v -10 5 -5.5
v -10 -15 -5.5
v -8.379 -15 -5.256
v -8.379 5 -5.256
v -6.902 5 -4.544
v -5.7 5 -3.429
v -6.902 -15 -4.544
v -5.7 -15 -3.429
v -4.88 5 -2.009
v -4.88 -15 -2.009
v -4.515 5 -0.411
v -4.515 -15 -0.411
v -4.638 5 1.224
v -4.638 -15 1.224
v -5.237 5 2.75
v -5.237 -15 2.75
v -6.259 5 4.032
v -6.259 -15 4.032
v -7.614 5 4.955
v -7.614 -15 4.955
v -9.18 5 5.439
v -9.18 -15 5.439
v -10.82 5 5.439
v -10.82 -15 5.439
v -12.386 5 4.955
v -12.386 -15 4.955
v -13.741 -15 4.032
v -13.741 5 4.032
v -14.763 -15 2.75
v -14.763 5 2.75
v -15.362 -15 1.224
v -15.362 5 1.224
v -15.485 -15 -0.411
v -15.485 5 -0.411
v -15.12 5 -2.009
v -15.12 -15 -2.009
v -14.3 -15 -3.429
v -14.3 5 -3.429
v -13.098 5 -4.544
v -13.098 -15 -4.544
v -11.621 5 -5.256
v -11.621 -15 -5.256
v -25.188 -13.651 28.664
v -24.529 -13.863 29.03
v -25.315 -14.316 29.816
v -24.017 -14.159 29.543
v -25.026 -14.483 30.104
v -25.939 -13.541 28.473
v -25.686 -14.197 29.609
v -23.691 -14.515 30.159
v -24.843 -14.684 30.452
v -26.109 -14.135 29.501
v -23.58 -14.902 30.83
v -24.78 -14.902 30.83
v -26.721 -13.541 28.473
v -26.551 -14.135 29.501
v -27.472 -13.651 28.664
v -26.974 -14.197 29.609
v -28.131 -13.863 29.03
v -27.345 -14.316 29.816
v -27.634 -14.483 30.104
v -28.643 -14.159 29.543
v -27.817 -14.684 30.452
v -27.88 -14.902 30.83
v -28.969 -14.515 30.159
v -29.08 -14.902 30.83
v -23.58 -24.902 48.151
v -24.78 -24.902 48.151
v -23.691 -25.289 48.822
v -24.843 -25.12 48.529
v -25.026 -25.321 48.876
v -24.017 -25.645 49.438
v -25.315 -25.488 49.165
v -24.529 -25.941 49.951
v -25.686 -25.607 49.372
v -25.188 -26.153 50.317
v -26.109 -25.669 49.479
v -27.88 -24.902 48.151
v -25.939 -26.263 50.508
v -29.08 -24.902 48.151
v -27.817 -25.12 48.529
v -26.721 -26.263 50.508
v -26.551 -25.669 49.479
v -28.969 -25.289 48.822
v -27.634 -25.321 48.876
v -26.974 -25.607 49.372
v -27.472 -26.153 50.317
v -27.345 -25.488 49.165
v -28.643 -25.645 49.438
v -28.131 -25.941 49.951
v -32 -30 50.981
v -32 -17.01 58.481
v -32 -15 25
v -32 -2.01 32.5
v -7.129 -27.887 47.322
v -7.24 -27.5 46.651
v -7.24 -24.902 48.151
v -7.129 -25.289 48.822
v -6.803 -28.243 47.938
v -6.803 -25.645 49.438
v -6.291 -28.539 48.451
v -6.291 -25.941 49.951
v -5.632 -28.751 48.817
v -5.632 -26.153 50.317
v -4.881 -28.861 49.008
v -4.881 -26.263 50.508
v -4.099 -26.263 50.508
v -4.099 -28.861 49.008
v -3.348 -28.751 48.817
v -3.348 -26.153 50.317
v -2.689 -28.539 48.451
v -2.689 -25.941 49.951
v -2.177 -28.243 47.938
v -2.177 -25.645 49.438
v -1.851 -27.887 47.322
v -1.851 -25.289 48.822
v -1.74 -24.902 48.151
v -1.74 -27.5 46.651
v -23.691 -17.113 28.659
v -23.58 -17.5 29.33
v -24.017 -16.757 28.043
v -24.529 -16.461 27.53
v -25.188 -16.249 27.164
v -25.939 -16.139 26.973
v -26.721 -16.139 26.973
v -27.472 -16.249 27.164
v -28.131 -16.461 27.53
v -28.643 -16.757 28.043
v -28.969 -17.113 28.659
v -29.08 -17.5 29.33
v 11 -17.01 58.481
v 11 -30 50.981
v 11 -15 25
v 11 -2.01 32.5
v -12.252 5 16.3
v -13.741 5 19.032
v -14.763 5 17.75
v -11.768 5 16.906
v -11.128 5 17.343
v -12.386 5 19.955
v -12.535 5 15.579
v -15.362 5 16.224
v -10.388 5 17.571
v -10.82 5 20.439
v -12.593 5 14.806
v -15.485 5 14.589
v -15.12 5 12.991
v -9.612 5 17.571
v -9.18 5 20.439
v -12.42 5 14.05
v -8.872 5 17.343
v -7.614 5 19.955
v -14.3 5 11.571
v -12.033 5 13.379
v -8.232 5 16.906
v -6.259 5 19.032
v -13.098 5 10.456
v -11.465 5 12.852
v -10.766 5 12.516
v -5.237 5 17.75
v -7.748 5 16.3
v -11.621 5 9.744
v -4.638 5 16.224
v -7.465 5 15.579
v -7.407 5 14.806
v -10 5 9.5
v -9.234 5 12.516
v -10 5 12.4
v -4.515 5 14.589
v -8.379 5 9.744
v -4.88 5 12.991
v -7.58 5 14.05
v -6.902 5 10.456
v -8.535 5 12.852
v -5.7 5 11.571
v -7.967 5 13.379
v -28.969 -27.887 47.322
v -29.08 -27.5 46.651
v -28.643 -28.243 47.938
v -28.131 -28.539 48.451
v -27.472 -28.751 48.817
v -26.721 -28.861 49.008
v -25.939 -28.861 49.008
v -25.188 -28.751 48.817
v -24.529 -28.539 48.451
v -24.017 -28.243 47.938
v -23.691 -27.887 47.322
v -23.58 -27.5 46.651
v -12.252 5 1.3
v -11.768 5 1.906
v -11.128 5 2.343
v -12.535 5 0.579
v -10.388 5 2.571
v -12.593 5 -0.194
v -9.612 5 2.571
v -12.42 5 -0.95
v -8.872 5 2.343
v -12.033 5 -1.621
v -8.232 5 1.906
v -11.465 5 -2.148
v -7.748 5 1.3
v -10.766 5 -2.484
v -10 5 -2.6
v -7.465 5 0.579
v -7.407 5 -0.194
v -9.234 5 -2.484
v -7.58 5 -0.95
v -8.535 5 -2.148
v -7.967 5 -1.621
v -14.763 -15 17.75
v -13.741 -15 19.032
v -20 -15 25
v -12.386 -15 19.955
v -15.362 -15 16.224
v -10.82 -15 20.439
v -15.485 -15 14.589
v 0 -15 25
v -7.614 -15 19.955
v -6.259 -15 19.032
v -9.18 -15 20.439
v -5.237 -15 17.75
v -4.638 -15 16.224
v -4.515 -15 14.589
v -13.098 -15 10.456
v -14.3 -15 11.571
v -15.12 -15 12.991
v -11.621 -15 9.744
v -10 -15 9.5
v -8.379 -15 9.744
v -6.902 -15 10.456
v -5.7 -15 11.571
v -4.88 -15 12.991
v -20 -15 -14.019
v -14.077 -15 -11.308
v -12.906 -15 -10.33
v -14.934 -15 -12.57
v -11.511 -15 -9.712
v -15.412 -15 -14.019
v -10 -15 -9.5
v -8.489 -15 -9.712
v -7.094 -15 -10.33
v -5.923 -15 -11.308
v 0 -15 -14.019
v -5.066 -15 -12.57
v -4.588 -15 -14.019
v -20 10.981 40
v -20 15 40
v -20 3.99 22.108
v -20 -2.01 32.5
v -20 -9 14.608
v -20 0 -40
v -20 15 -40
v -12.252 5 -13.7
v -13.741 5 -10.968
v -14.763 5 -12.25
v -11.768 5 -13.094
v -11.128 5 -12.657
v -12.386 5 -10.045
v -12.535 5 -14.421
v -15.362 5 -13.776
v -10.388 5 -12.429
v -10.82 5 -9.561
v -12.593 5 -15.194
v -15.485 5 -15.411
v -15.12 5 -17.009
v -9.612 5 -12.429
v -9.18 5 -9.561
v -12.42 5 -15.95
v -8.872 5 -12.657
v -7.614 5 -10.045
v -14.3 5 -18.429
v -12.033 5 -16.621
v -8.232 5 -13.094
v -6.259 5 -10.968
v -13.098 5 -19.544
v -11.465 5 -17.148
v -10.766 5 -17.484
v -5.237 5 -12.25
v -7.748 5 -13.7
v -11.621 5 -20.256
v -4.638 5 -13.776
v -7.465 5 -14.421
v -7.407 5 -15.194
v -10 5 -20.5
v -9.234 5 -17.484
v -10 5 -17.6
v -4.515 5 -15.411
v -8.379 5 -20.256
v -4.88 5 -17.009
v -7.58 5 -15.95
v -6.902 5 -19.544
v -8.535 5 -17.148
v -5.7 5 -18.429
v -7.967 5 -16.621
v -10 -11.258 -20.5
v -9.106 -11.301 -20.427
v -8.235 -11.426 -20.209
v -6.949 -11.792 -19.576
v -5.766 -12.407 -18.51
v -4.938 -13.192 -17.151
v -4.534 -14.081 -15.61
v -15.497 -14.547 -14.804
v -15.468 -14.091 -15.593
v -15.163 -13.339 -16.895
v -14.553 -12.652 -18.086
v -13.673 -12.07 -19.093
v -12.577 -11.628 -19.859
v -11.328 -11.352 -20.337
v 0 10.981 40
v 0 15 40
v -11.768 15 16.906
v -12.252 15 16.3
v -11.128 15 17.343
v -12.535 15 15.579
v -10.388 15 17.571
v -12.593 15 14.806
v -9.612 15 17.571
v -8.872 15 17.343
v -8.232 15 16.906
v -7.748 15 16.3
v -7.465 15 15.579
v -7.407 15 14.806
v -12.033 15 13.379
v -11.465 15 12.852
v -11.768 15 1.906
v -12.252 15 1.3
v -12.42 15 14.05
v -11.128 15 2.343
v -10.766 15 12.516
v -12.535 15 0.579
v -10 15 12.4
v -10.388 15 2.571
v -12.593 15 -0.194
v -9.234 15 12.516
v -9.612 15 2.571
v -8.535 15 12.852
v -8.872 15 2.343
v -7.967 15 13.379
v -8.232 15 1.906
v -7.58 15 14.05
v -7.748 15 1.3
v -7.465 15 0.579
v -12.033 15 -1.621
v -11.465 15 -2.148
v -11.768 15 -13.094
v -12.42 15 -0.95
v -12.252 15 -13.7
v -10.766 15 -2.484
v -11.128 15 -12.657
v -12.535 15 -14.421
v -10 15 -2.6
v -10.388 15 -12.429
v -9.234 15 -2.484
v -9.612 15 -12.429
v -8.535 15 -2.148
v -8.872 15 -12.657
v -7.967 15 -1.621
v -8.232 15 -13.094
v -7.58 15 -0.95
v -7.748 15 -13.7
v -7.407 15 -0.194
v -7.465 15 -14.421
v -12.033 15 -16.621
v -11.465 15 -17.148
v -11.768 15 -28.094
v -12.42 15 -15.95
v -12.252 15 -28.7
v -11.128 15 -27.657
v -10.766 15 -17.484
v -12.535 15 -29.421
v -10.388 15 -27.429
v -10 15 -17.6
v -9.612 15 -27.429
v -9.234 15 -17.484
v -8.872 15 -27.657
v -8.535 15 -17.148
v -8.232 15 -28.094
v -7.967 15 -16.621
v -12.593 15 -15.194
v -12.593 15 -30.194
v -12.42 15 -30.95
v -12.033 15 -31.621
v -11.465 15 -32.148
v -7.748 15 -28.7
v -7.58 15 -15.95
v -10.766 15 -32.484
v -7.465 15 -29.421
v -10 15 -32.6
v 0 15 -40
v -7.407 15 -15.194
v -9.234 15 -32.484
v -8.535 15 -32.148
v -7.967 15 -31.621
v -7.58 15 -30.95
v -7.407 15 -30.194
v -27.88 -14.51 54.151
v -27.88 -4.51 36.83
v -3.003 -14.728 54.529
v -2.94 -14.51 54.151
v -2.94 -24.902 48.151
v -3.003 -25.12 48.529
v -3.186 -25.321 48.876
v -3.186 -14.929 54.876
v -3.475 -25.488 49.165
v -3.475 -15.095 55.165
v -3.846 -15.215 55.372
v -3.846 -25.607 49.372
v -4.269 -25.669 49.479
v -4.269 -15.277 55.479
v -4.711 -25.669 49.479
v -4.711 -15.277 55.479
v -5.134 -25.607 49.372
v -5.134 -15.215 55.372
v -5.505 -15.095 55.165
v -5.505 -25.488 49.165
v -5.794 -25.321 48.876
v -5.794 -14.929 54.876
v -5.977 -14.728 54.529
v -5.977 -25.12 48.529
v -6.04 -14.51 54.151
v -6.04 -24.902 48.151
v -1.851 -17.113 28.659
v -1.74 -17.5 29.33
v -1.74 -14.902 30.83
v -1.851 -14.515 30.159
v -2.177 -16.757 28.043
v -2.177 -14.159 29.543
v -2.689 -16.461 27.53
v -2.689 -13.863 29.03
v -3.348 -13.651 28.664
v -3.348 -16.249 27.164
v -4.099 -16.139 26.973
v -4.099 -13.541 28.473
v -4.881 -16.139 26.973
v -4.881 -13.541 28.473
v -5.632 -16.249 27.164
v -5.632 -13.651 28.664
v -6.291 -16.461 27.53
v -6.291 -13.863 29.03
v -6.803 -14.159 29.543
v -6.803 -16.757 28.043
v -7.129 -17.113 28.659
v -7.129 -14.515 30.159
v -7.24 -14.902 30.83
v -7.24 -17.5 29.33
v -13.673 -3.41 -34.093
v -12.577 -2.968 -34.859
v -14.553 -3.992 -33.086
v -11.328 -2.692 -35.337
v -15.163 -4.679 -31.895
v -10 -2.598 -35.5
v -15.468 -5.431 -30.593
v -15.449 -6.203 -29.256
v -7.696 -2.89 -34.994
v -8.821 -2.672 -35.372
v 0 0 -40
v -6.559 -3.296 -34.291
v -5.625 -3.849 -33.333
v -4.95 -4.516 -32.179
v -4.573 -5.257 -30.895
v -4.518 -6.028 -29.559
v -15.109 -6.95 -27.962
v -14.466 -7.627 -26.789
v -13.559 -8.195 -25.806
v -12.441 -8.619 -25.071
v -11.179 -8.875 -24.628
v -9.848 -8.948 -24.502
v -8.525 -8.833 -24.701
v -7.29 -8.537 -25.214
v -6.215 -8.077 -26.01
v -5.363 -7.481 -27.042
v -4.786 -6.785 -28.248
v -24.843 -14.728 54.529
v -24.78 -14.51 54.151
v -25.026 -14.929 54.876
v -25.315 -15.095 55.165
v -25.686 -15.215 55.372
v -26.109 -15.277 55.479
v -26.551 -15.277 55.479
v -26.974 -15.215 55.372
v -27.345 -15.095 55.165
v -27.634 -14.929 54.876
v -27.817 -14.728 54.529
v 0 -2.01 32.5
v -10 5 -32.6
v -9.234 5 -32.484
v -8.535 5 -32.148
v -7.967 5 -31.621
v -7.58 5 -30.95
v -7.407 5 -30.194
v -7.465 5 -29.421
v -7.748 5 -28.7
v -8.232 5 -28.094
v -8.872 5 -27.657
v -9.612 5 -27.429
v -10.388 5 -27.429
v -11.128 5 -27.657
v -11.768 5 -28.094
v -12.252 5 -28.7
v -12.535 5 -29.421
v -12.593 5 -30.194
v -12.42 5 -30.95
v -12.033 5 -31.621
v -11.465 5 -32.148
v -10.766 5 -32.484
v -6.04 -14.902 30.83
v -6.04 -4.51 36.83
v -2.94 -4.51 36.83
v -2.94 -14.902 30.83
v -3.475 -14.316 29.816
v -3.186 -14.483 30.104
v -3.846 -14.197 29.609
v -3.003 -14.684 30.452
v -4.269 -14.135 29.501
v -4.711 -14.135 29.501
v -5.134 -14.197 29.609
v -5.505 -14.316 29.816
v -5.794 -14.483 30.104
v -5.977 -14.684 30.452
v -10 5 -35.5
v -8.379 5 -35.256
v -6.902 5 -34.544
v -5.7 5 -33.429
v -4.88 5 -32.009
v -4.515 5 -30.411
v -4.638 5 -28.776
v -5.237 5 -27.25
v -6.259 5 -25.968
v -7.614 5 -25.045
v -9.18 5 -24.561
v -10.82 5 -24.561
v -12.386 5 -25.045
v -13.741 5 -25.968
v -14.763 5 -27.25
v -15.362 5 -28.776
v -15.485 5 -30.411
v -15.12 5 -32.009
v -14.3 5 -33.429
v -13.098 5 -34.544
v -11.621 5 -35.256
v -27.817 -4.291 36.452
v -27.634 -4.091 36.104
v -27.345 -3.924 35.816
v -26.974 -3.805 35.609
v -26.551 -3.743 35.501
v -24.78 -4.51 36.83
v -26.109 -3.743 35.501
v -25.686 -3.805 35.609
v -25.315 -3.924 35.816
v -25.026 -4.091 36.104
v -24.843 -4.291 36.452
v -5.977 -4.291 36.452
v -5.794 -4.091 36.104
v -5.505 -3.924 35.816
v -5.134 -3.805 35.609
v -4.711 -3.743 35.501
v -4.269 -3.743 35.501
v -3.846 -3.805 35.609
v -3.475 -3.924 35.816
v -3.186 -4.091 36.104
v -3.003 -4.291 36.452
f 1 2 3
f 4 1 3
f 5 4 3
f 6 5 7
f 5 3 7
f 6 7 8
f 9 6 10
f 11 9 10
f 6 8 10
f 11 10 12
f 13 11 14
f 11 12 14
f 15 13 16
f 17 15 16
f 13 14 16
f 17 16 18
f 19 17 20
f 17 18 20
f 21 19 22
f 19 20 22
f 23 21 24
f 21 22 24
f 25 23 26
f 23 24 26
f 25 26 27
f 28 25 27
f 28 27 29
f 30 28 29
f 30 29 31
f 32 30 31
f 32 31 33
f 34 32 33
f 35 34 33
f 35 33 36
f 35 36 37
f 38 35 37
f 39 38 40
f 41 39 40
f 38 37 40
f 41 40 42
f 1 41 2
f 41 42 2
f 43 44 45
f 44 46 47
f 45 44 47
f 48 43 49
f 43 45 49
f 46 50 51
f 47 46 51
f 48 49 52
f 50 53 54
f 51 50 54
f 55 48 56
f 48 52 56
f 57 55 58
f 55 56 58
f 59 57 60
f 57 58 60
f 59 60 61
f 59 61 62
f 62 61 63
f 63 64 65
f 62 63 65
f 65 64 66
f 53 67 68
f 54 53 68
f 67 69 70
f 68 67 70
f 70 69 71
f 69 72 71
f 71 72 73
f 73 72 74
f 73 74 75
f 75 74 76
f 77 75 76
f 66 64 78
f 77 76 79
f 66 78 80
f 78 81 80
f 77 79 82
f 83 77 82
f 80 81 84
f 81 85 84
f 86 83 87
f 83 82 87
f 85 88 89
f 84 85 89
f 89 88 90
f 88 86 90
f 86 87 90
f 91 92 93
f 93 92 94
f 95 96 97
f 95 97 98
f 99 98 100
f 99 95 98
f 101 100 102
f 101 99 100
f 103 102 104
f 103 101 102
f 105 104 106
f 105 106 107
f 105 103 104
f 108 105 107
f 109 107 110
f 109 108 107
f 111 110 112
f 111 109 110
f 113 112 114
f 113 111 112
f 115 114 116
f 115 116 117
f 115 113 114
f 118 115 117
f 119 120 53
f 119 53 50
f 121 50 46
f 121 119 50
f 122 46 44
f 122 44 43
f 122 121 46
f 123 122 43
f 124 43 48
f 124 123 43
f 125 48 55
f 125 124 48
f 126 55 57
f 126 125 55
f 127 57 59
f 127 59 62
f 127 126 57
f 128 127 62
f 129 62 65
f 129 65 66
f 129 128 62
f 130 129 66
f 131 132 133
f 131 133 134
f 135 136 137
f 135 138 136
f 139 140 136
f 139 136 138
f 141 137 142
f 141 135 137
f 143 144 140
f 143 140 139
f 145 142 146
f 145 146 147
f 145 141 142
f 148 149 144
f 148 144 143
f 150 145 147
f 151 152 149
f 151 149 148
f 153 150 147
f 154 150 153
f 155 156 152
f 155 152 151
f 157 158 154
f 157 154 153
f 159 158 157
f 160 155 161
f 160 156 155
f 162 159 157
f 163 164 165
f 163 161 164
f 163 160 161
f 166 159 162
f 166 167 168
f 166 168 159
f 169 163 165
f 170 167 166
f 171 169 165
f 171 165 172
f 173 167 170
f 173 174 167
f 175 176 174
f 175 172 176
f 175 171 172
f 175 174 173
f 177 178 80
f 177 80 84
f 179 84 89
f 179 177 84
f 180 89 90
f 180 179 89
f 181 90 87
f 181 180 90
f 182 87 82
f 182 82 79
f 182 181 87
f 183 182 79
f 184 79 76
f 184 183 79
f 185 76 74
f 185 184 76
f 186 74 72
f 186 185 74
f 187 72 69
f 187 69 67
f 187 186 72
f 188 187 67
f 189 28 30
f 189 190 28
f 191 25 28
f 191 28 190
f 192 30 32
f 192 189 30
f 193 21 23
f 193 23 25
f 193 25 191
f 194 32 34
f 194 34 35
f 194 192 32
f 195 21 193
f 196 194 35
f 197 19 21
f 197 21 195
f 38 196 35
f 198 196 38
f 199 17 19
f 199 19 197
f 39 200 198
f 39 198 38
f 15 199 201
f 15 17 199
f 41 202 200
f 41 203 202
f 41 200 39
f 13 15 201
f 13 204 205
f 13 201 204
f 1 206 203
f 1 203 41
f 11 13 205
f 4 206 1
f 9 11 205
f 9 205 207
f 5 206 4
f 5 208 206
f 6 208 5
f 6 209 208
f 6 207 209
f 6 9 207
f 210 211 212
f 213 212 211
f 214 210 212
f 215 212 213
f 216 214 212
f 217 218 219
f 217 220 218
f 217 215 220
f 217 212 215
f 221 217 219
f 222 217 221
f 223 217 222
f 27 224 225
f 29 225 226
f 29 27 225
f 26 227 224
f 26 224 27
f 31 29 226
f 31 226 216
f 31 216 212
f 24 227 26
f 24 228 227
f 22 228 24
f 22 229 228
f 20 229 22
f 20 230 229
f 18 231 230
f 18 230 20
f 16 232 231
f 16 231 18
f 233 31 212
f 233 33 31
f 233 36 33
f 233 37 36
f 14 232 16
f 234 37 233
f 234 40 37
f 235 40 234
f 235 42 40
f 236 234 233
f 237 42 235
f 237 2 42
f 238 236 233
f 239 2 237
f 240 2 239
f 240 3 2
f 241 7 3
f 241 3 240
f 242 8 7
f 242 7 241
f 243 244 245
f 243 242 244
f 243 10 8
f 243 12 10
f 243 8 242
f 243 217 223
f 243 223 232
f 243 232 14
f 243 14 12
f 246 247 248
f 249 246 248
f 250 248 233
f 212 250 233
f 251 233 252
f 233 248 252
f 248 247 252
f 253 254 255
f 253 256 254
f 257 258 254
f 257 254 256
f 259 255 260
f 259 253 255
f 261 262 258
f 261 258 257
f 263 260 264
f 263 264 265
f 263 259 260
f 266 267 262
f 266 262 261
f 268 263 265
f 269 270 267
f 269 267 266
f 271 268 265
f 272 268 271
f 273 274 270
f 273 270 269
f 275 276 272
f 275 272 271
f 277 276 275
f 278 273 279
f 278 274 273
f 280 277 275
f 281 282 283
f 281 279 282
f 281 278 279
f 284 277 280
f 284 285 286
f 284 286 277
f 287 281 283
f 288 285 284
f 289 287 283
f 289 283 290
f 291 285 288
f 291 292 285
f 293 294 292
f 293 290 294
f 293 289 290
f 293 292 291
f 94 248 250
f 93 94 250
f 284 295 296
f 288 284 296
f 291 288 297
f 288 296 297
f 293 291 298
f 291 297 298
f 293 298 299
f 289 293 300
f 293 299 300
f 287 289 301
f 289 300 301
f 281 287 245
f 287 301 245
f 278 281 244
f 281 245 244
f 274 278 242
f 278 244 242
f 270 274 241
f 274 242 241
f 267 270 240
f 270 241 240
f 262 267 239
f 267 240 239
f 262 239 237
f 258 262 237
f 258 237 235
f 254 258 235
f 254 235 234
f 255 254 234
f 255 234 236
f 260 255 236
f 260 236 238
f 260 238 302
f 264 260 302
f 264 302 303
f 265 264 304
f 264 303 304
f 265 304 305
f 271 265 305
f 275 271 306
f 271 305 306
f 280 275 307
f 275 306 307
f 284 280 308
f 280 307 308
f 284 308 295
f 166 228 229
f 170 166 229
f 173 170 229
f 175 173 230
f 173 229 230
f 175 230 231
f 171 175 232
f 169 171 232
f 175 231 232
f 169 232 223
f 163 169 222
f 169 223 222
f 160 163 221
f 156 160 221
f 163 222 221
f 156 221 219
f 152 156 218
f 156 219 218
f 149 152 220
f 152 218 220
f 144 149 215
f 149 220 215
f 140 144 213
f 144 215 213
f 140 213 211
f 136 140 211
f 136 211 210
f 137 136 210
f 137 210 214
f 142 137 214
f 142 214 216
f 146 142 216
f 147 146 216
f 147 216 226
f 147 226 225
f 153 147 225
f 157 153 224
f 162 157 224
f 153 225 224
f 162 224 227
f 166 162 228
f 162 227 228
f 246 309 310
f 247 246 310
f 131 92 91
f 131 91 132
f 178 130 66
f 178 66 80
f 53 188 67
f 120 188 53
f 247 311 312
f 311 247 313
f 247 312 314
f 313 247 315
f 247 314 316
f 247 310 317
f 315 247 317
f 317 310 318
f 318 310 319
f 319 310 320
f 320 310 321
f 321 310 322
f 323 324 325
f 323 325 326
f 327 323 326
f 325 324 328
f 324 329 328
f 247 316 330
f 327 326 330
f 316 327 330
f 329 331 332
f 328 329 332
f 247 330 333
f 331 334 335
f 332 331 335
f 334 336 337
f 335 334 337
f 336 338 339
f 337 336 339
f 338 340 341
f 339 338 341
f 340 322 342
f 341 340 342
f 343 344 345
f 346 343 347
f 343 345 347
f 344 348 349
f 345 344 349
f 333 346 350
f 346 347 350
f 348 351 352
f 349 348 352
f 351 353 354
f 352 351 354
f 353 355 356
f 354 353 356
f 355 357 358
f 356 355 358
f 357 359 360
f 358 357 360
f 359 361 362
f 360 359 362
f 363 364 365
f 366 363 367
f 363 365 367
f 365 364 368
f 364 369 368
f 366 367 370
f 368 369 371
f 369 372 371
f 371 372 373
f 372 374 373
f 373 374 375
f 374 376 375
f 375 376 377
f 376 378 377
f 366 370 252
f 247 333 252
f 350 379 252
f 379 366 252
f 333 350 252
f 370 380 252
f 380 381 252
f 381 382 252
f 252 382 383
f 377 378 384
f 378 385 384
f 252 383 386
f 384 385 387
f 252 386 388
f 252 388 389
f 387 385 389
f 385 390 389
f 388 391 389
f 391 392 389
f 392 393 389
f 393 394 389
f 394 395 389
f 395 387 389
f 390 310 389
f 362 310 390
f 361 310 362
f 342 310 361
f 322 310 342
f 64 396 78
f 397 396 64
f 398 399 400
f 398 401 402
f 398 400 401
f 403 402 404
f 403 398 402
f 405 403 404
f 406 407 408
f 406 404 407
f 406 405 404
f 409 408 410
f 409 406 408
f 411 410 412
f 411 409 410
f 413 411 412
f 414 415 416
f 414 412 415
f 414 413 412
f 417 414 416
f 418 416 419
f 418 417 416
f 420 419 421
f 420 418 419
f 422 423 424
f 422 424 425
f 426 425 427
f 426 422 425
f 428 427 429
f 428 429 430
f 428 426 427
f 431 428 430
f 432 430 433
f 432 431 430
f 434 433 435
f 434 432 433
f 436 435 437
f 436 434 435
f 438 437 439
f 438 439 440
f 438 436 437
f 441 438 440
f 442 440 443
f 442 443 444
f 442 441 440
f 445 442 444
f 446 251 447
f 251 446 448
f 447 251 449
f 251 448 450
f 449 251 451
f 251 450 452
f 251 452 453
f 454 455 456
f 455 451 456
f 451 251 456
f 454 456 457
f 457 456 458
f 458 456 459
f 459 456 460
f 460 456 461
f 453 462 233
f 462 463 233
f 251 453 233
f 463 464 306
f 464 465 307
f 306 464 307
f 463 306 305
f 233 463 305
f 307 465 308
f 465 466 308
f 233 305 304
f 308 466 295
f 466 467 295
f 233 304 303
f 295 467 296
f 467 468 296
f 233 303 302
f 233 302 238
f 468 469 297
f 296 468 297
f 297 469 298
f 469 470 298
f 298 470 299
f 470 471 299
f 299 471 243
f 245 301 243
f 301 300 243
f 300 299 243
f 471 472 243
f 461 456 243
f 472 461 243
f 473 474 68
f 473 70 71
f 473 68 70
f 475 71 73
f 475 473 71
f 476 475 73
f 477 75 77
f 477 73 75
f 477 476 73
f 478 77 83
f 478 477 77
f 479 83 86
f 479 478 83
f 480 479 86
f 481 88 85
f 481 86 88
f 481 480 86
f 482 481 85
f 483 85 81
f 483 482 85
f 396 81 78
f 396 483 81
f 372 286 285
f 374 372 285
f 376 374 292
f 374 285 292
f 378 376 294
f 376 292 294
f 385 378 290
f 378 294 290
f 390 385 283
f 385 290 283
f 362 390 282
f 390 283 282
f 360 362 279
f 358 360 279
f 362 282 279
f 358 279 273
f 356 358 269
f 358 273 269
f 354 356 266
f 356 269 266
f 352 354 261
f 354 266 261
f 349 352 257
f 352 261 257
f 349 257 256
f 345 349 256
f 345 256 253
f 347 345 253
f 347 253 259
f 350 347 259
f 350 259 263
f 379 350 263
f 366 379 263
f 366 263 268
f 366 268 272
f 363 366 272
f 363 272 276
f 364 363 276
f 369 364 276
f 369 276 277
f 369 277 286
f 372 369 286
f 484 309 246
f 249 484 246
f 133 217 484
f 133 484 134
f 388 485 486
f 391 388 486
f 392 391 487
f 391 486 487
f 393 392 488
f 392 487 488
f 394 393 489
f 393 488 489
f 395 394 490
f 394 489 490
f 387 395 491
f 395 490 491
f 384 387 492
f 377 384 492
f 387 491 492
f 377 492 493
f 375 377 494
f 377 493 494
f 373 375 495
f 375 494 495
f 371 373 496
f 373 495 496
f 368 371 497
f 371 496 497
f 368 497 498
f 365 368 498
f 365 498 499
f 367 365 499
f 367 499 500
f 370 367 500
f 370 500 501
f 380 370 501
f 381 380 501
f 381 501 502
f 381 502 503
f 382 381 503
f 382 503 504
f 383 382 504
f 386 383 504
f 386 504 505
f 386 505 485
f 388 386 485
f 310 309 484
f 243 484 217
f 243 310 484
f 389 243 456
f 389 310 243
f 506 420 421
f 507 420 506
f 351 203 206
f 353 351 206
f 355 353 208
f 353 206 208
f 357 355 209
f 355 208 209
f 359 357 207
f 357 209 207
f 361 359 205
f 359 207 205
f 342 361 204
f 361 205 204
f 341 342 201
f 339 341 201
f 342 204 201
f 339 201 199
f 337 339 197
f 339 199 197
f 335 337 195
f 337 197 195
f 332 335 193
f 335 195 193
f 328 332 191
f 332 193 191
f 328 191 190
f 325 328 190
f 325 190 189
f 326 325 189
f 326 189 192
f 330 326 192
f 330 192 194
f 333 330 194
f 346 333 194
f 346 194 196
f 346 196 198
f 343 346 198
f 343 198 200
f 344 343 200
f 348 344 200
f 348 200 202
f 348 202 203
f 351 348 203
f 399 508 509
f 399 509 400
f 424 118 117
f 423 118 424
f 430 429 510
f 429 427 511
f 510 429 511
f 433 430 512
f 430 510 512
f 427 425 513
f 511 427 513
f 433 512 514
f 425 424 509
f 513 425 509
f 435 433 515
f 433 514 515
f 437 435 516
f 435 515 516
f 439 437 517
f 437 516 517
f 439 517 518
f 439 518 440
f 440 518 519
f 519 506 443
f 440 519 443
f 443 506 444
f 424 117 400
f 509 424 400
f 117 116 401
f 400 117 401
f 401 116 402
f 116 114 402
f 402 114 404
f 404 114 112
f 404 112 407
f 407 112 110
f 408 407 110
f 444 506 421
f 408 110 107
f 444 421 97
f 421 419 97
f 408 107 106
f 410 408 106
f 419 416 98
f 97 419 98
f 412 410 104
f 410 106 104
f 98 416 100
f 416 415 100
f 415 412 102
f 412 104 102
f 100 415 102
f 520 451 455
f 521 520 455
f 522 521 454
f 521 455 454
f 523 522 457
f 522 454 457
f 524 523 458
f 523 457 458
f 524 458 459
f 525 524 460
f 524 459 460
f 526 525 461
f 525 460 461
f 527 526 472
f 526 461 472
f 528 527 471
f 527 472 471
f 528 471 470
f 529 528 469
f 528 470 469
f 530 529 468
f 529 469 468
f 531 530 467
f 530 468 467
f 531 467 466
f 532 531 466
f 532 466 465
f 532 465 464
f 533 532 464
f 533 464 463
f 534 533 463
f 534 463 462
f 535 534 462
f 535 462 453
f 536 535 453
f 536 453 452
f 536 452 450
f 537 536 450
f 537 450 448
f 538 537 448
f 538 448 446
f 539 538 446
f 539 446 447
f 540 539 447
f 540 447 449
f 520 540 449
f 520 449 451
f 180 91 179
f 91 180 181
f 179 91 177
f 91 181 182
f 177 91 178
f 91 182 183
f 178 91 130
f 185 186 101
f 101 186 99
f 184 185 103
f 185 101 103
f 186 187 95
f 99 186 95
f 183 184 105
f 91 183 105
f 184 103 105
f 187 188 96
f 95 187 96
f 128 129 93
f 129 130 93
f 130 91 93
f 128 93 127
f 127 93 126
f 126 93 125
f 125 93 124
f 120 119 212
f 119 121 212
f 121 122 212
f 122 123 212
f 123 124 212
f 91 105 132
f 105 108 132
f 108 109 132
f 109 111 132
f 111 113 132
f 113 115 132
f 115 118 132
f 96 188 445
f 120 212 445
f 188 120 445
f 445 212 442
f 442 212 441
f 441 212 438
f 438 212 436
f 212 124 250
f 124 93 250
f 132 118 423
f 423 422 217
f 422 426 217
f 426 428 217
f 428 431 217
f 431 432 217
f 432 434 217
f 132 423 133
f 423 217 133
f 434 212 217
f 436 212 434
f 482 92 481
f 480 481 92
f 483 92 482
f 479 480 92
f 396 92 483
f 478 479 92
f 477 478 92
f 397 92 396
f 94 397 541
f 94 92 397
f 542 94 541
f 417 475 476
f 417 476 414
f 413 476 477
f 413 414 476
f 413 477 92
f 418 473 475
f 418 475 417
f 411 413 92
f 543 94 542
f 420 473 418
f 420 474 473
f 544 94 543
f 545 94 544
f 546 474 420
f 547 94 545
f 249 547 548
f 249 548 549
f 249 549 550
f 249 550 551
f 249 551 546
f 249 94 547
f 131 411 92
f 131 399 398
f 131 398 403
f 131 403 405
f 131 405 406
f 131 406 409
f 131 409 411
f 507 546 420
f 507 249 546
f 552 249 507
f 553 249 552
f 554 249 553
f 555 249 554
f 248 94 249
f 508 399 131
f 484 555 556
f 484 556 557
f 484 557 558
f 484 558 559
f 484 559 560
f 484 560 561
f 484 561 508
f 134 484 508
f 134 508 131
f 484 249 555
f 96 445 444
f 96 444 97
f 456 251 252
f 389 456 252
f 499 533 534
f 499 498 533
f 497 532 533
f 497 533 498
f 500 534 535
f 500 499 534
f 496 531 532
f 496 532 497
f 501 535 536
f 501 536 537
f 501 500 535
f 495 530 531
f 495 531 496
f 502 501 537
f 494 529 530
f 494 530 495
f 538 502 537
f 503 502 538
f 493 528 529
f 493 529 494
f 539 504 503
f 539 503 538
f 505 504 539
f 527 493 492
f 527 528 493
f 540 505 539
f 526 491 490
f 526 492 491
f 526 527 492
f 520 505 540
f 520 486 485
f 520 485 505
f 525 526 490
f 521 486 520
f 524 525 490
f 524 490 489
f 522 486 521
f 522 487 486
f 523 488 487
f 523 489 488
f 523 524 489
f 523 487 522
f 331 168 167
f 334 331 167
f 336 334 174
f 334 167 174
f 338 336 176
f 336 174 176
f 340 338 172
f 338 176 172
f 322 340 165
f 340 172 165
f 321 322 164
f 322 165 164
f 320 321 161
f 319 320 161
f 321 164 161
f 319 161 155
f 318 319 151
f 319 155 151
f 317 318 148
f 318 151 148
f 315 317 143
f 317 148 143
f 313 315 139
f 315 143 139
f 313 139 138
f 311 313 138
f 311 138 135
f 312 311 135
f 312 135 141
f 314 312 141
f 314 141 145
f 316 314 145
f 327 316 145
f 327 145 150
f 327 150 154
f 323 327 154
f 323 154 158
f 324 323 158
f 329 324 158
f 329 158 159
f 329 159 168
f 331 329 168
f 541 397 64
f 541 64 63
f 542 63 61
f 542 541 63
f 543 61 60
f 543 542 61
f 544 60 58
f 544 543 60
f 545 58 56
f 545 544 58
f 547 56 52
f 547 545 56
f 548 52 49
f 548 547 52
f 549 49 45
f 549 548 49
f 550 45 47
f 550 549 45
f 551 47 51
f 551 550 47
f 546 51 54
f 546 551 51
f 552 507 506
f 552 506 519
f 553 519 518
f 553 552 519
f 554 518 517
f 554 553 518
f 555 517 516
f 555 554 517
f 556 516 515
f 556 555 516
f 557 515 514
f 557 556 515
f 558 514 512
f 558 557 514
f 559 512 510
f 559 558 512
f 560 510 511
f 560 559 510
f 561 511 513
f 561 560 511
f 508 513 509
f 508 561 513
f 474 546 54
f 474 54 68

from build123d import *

# Parameters (mm, degrees)
SKETCH1_W           = 80
SKETCH1_H           = 30
BOSS_EXTRUDE1_DEPTH = 20
CHAMFER1_SIZE       = 15
CHAMFER1_SIZE2      = 25.980762114
SKETCH2_W           = 43
SKETCH2_H           = 15
BOSS_EXTRUDE2_DEPTH = 30
CUT_EXTRUDE1_REACH  = 75.891
CUT_EXTRUDE2_DEPTH  = 3
SKETCH5_W           = 12
SKETCH5_H           = 12
BOSS_EXTRUDE3_DEPTH = 15
CHAMFER2_SIZE       = 12
CUT_EXTRUDE3_REACH  = 75.103
SKETCH6_R           = 2.6
SKETCH7_R           = 5.5
CUT_EXTRUDE4_DEPTH  = 20
CHAMFER3_SIZE       = 15
CHAMFER3_SIZE_2     = 25.980762114


# Some blends are built 0.0001 mm under size
with BuildPart() as part:
    # Sketch1 → Boss-Extrude1 (new body)
    with BuildSketch(Plane(origin=(0, 0, 0), x_dir=(0, 0, -1), z_dir=(1, 0, 0))):
        Rectangle(SKETCH1_W, SKETCH1_H)
    extrude(amount=-BOSS_EXTRUDE1_DEPTH)

    # Chamfer1
    chamfer1_edges = [part.edges().sort_by_distance(p)[0] for p in [
        (-10, -15, 40),
    ]]
    chamfer1_side = [part.faces().sort_by_distance(p)[0] for p in [
        (-10, -15, 0),
    ]]
    chamfer(chamfer1_edges, length=CHAMFER1_SIZE, length2=CHAMFER1_SIZE2, reference=chamfer1_side[0])

    # Sketch2 → Boss-Extrude2 (add)
    with BuildSketch(Plane(origin=(0, -14.575317547, 25.245190528), x_dir=(1, 0, 0), z_dir=(0, -0.5000000000000012, 0.866025403784438))):
        with Locations((-10.5, 7.009618943)):
            Rectangle(SKETCH2_W, SKETCH2_H)
    extrude(amount=BOSS_EXTRUDE2_DEPTH)

    # Sketch3 → Cut-Extrude1 (cut, up to next)
    with BuildSketch(Plane(origin=(0, 12.565698604, 7.254809472), x_dir=(1, 0, 0), z_dir=(0, 0.8660254037844378, 0.5000000000000013)), mode=Mode.PRIVATE) as cut_extrude1_sk1:
        with BuildLine():
            Line((-24.78, -34.150635095), (-24.78, -54.150635095))
            ThreePointArc((-24.78, -54.150635095), (-26.33, -55.700635095), (-27.88, -54.150635095))
            Line((-27.88, -54.150635095), (-27.88, -34.150635095))
            ThreePointArc((-27.88, -34.150635095), (-26.33, -32.600635095), (-24.78, -34.150635095))
        make_face()
    cut_extrude1_tool1 = extrude(cut_extrude1_sk1.sketch, amount=-CUT_EXTRUDE1_REACH, mode=Mode.PRIVATE) & part.part
    # Sketch3 → Cut-Extrude1 (cut, up to next)
    with BuildSketch(Plane(origin=(0, 12.565698604, 7.254809472), x_dir=(1, 0, 0), z_dir=(0, 0.8660254037844378, 0.5000000000000013)), mode=Mode.PRIVATE) as cut_extrude1_sk2:
        with BuildLine():
            Line((-2.94, -34.150635095), (-2.94, -54.150635095))
            ThreePointArc((-2.94, -54.150635095), (-4.49, -55.700635095), (-6.04, -54.150635095))
            Line((-6.04, -54.150635095), (-6.04, -34.150635095))
            ThreePointArc((-6.04, -34.150635095), (-4.49, -32.600635095), (-2.94, -34.150635095))
        make_face()
    cut_extrude1_tool2 = extrude(cut_extrude1_sk2.sketch, amount=-CUT_EXTRUDE1_REACH, mode=Mode.PRIVATE) & part.part
    add(cut_extrude1_tool1.solids().sort_by_distance((-26.33, -9.509619, 45.490381))[0], mode=Mode.SUBTRACT)
    add(cut_extrude1_tool2.solids().sort_by_distance((-4.49, -9.509619, 45.490381))[0], mode=Mode.SUBTRACT)

    # Sketch4 → Cut-Extrude2 (cut)
    with BuildSketch(Plane(origin=(0, -0.424682453, -0.245190528), x_dir=(1, 0, 0), z_dir=(0, -0.8660254037844379, -0.5000000000000013))):
        with BuildLine():
            Line((-23.58, 54.150635095), (-23.58, 34.150635095))
            ThreePointArc((-23.58, 34.150635095), (-26.33, 31.400635095), (-29.08, 34.150635095))
            Line((-29.08, 34.150635095), (-29.08, 54.150635095))
            ThreePointArc((-29.08, 54.150635095), (-26.33, 56.900635095), (-23.58, 54.150635095))
        make_face()
        with BuildLine():
            Line((-1.74, 54.150635095), (-1.74, 34.150635095))
            ThreePointArc((-1.74, 34.150635095), (-4.49, 31.400635095), (-7.24, 34.150635095))
            Line((-7.24, 34.150635095), (-7.24, 54.150635095))
            ThreePointArc((-7.24, 54.150635095), (-4.49, 56.900635095), (-1.74, 54.150635095))
        make_face()
    extrude(amount=-CUT_EXTRUDE2_DEPTH, mode=Mode.SUBTRACT)

    # Sketch5 → Boss-Extrude3 (add)
    with BuildSketch(Plane(origin=(0, 12.565698604, 7.254809472), x_dir=(1, 0, 0), z_dir=(0, 0.8660254037844378, 0.5000000000000013))):
        with Locations((-26, -23.150635095)):
            Rectangle(SKETCH5_W, SKETCH5_H)
    extrude(amount=-BOSS_EXTRUDE3_DEPTH)

    # Chamfer2
    chamfer2_edges = [part.edges().sort_by_distance(p)[0] for p in [
        (-32, -2.504809472, 18.357695155),
    ]]
    chamfer(chamfer2_edges, length=CHAMFER2_SIZE - 0.0001)  # a hair under: the kernel refuses the full size

    # Sketch6 → Cut-Extrude3 (cut, up to next)
    with BuildSketch(Plane.XZ.offset(15), mode=Mode.PRIVATE) as cut_extrude3_sk1:
        with Locations(Location((-10, -30, 0), (0, 0, 270))):
            Circle(SKETCH6_R)
    cut_extrude3_tool1 = extrude(cut_extrude3_sk1.sketch, amount=-CUT_EXTRUDE3_REACH, mode=Mode.PRIVATE) & part.part
    # Sketch6 → Cut-Extrude3 (cut, up to next)
    with BuildSketch(Plane.XZ.offset(15), mode=Mode.PRIVATE) as cut_extrude3_sk2:
        with Locations(Location((-10, -15, 0), (0, 0, 270))):
            Circle(SKETCH6_R)
    cut_extrude3_tool2 = extrude(cut_extrude3_sk2.sketch, amount=-CUT_EXTRUDE3_REACH, mode=Mode.PRIVATE) & part.part
    # Sketch6 → Cut-Extrude3 (cut, up to next)
    with BuildSketch(Plane.XZ.offset(15), mode=Mode.PRIVATE) as cut_extrude3_sk3:
        with Locations(Location((-10, 0, 0), (0, 0, 270))):
            Circle(SKETCH6_R)
    cut_extrude3_tool3 = extrude(cut_extrude3_sk3.sketch, amount=-CUT_EXTRUDE3_REACH, mode=Mode.PRIVATE) & part.part
    # Sketch6 → Cut-Extrude3 (cut, up to next)
    with BuildSketch(Plane.XZ.offset(15), mode=Mode.PRIVATE) as cut_extrude3_sk4:
        with Locations(Location((-10, 15, 0), (0, 0, 270))):
            Circle(SKETCH6_R)
    cut_extrude3_tool4 = extrude(cut_extrude3_sk4.sketch, amount=-CUT_EXTRUDE3_REACH, mode=Mode.PRIVATE) & part.part
    add(cut_extrude3_tool1.solids().sort_by_distance((-10, -15, -30))[0], mode=Mode.SUBTRACT)
    add(cut_extrude3_tool2.solids().sort_by_distance((-10, -15, -15))[0], mode=Mode.SUBTRACT)
    add(cut_extrude3_tool3.solids().sort_by_distance((-10, -15, 0))[0], mode=Mode.SUBTRACT)
    add(cut_extrude3_tool4.solids().sort_by_distance((-10, -15, 15))[0], mode=Mode.SUBTRACT)

    # Sketch7 → Cut-Extrude4 (cut)
    with BuildSketch(Plane.XZ.offset(15)):
        with Locations(Location((-10, 15, 0), (0, 0, 270))):
            Circle(SKETCH7_R)
        with Locations(Location((-10, 0, 0), (0, 0, 270))):
            Circle(SKETCH7_R)
        with Locations(Location((-10, -15, 0), (0, 0, 270))):
            Circle(SKETCH7_R)
        with Locations(Location((-10, -30, 0), (0, 0, 270))):
            Circle(SKETCH7_R)
    extrude(amount=-CUT_EXTRUDE4_DEPTH, mode=Mode.SUBTRACT)

    # Chamfer3
    # the kernel refuses this chamfer: 25.980762114, 15 mm, written as the material it takes off along each edge
    with BuildSketch(Plane(origin=(67.214459559, -15, -40), x_dir=(0, 0.9983227437537926, -0.057893862402671366), z_dir=(-1, 0, 0))) as chamfer3_piece_1:
        Polygon((CHAMFER3_SIZE * 0.998322743754, -CHAMFER3_SIZE * 0.0578938624027), (-CHAMFER3_SIZE_2 * 0.0578938624016, -CHAMFER3_SIZE_2 * 0.998322743736), (0, 0), align=None)
    extrude(amount=154.428919118, mode=Mode.SUBTRACT)


solid = part.part
